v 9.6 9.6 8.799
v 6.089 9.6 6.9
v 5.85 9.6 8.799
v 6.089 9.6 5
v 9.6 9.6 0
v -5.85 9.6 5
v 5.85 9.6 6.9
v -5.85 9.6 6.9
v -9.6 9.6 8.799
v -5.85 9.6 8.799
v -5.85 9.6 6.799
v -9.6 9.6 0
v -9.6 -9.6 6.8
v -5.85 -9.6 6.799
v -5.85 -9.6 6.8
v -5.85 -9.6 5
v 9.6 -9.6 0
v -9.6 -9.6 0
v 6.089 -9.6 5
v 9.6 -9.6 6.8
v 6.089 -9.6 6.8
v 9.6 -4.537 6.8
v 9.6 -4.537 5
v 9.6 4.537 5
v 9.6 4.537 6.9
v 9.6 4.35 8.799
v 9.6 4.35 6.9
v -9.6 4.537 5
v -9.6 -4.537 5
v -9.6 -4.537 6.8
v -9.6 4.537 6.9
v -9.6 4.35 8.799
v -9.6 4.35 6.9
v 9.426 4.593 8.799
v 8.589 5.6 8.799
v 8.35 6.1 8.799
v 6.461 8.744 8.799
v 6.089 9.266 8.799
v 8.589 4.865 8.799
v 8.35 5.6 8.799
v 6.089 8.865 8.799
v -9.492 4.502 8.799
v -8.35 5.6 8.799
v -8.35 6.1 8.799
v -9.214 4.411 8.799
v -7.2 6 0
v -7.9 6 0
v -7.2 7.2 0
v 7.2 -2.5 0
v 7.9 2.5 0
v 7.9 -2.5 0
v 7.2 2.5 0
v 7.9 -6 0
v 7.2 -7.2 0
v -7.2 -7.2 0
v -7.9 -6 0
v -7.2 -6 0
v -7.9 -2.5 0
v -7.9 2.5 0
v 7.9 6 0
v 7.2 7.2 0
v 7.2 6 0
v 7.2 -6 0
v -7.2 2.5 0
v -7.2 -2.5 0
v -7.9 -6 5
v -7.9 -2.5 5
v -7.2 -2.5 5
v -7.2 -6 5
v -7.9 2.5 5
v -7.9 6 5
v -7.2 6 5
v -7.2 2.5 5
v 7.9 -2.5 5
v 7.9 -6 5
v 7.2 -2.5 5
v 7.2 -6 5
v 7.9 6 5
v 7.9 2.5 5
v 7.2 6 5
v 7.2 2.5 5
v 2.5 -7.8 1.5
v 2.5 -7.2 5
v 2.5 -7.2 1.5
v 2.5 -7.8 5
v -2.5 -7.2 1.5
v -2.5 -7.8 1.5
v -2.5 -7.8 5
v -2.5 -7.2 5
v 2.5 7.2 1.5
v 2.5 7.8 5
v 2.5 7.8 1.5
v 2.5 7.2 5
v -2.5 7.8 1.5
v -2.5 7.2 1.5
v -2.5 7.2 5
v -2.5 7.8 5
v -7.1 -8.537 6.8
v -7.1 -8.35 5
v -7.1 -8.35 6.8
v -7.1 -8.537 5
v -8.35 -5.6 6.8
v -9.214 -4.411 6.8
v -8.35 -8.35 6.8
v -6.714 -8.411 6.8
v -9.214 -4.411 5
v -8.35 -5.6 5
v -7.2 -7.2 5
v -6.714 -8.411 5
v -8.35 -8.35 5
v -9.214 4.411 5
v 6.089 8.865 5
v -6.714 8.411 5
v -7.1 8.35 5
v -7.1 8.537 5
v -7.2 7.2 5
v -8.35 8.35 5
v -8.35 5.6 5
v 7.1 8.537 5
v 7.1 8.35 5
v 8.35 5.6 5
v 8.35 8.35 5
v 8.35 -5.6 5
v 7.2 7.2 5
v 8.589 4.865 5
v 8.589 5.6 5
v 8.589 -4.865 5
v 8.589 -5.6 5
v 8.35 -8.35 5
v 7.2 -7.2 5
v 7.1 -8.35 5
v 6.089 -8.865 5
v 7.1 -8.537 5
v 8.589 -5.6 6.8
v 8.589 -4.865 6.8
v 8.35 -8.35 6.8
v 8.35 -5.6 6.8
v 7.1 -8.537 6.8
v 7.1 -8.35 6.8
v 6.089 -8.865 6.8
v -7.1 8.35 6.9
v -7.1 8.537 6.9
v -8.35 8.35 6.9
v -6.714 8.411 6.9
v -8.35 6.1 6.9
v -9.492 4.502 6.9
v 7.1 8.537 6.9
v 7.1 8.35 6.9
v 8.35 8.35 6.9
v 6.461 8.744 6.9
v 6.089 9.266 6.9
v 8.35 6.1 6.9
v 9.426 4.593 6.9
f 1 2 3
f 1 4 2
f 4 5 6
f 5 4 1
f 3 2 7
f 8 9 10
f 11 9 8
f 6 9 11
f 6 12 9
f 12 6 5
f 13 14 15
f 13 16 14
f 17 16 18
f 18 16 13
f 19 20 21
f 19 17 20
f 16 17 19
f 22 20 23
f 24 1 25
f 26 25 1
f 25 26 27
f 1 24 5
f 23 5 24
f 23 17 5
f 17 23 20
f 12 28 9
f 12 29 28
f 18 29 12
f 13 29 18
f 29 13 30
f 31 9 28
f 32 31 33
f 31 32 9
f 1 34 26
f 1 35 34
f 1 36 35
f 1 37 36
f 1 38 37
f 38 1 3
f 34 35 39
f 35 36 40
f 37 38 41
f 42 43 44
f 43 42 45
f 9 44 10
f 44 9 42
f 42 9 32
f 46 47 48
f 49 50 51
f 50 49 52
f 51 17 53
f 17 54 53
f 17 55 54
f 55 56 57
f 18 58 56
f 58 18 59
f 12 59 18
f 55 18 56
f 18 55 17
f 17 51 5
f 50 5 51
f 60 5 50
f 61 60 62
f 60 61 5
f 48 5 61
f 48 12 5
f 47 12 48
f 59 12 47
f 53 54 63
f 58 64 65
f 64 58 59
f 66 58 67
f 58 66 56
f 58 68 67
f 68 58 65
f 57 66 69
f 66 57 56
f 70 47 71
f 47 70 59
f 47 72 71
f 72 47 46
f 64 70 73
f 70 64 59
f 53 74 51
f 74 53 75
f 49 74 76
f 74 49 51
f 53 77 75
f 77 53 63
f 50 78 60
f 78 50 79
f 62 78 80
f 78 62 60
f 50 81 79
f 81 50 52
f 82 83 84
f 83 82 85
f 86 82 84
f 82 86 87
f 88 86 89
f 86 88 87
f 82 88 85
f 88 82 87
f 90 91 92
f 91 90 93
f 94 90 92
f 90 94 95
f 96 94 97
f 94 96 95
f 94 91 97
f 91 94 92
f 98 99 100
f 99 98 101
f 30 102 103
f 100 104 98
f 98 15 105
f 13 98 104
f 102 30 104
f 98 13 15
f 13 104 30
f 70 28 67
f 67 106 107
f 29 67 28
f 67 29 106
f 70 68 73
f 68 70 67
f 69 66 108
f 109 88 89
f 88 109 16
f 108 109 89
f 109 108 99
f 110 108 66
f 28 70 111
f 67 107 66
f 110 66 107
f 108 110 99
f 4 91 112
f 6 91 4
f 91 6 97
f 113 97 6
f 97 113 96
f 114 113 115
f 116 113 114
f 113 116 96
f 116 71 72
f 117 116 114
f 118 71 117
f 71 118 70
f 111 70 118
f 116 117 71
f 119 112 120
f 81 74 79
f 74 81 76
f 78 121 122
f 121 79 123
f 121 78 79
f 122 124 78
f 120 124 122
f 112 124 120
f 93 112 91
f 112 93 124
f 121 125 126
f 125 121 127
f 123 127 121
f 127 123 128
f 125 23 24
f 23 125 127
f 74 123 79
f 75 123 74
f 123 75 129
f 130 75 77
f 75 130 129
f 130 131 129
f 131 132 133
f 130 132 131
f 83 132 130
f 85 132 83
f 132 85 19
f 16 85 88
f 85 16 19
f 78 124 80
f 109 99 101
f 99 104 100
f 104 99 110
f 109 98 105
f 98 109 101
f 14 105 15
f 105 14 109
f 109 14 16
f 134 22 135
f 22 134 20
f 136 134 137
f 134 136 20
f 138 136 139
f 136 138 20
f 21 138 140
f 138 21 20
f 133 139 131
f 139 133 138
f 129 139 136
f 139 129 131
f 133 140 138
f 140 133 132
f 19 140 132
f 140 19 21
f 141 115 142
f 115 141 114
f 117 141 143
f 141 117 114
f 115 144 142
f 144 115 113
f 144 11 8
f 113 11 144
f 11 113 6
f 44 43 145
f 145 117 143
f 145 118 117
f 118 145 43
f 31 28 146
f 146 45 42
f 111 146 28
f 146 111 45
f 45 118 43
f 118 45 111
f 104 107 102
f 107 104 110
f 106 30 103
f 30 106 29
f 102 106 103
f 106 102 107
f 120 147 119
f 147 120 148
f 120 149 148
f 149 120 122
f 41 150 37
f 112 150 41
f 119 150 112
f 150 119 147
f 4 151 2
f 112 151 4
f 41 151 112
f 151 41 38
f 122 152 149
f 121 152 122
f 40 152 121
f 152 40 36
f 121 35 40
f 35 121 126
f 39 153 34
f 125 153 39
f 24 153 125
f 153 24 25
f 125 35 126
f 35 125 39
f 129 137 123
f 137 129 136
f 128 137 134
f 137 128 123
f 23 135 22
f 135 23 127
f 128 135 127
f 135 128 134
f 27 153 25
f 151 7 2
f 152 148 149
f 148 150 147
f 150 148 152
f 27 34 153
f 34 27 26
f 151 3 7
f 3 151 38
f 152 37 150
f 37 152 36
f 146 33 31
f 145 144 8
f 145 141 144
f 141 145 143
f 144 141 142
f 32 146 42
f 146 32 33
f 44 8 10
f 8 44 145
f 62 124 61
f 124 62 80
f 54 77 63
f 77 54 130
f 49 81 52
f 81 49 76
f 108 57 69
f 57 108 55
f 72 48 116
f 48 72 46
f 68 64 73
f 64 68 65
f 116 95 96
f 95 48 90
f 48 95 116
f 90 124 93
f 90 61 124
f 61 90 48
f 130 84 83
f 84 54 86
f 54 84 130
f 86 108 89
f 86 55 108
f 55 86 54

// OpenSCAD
group() {
	difference() {
		group() {
			multmatrix([[1, 0, 0, 0], [0, 1, 0, 0], [0, 0, 1, 4.4], [0, 0, 0, 1]]) {
				cube(size = [19.2, 19.2, 8.8], center = true);
			}
		}
		group() {
			group() {
				polyhedron(points = [[9.6, 9.6, 0], [-9.6, 9.6, 0], [-9.6, -9.6, 0], [9.6, -9.6, 0], [9.6, 9.6, -0], [-9.6, 9.6, -0], [-9.6, -9.6, -0], [9.6, -9.6, -0]], faces = [[0, 1, 2, 3], [4, 7, 6, 5], [0, 3, 7, 4], [0, 4, 5, 1], [1, 5, 6, 2], [2, 6, 7, 3]], convexity = 1);
			}
			multmatrix([[1, 0, 0, 0], [0, 1, 0, 0], [0, 0, 1, 8.7995], [0, 0, 0, 1]]) {
				union() {
					cube(size = [19.2, 19.2, 0.001], center = true);
					multmatrix([[1, 0, 0, 0], [0, 1, 0, 0], [0, 0, 1, -1], [0, 0, 0, 1]]) {
						union() {
							cube(size = [11.7, 19.2, 2.001], center = true);
							cube(size = [19.2, 8.7, 2.001], center = true);
						}
					}
				}
			}
			multmatrix([[1, 0, 0, 0], [0, 1, 0, 0], [0, 0, 1, 3.4], [0, 0, 0, 1]]) {
				cube(size = [14.4, 14.4, 6.8], center = true);
			}
			group() {
				group() {
					group() {
						multmatrix([[1, 0, 0, -7.5], [0, 1, 0, -4.25], [0, 0, 1, 3.4], [0, 0, 0, 1]]) {
							cube(size = [0.8, 3.5, 6.8], center = true);
						}
						multmatrix([[1, 0, 0, -7.5], [0, 1, 0, 4.25], [0, 0, 1, 3.4], [0, 0, 0, 1]]) {
							cube(size = [0.8, 3.5, 6.8], center = true);
						}
					}
					group() {
						multmatrix([[1, 0, 0, 7.5], [0, 1, 0, -4.25], [0, 0, 1, 3.4], [0, 0, 0, 1]]) {
							cube(size = [0.8, 3.5, 6.8], center = true);
						}
						multmatrix([[1, 0, 0, 7.5], [0, 1, 0, 4.25], [0, 0, 1, 3.4], [0, 0, 0, 1]]) {
							cube(size = [0.8, 3.5, 6.8], center = true);
						}
					}
				}
			}
			group() {
				multmatrix([[1, 0, 0, 0], [0, 1, 0, -7.1], [0, 0, 1, 4.15], [0, 0, 0, 1]]) {
					cube(size = [5, 1.4, 5.3], center = true);
				}
				multmatrix([[1, 0, 0, 0], [0, 1, 0, 7.1], [0, 0, 1, 4.15], [0, 0, 0, 1]]) {
					cube(size = [5, 1.4, 5.3], center = true);
				}
			}
			multmatrix([[1, 0, 0, 0], [0, 1, 0, 0], [0, 0, 1, 6.9], [0, 0, 0, 1]]) {
				difference() {
					cube(size = [19.2, 19.2, 3.8], center = true);
					union() {
						group() {
							multmatrix([[1, 0, 0, -8.35], [0, 1, 0, 8.975], [0, 0, 1, 0], [0, 0, 0, 1]]) {
								cube(size = [2.5, 1.25, 3.8], center = true);
							}
							multmatrix([[1, 0, 0, -7.1], [0, 1, 0, 9.6], [0, 0, 1, -1.9], [0, 0, 0, 1]]) {
								cylinder($fn = 0, $fa = 12, $fs = 2, h = 3.8, r1 = 1.25, r2 = 1.25, center = false);
							}
							group() {
								multmatrix([[1, 0, 0, -8.35], [0, 1, 0, -8.975], [0, 0, 1, -1], [0, 0, 0, 1]]) {
									cube(size = [2.5, 1.25, 1.8], center = true);
								}
								multmatrix([[1, 0, 0, -7.1], [0, 1, 0, -9.6], [0, 0, 1, -1.9], [0, 0, 0, 1]]) {
									cylinder($fn = 0, $fa = 12, $fs = 2, h = 1.8, r1 = 1.25, r2 = 1.25, center = false);
								}
							}
							multmatrix([[1, 0, 0, -8.975], [0, 1, 0, 7.6], [0, 0, 1, 0], [0, 0, 0, 1]]) {
								cube(size = [1.25, 4, 3.8], center = true);
							}
							multmatrix([[1, 0, 0, -9.6], [0, 1, 0, 5.6], [0, 0, 1, -1.9], [0, 0, 0, 1]]) {
								cylinder($fn = 0, $fa = 12, $fs = 2, h = 3.8, r1 = 1.25, r2 = 1.25, center = false);
							}
							multmatrix([[1, 0, 0, -8.975], [0, 1, 0, -7.6], [0, 0, 1, -1], [0, 0, 0, 1]]) {
								cube(size = [1.25, 4, 1.8], center = true);
							}
							multmatrix([[1, 0, 0, -9.6], [0, 1, 0, -5.6], [0, 0, 1, -1.9], [0, 0, 0, 1]]) {
								cylinder($fn = 0, $fa = 12, $fs = 2, h = 1.8, r1 = 1.25, r2 = 1.25, center = false);
							}
							multmatrix([[1, 0, 0, 8.35], [0, 1, 0, 8.975], [0, 0, 1, 0], [0, 0, 0, 1]]) {
								cube(size = [2.5, 1.25, 3.8], center = true);
							}
							multmatrix([[1, 0, 0, 7.1], [0, 1, 0, 9.6], [0, 0, 1, -1.9], [0, 0, 0, 1]]) {
								cylinder($fn = 0, $fa = 12, $fs = 2, h = 3.8, r1 = 1.25, r2 = 1.25, center = false);
							}
							group() {
								multmatrix([[1, 0, 0, 8.35], [0, 1, 0, -8.975], [0, 0, 1, -1], [0, 0, 0, 1]]) {
									cube(size = [2.5, 1.25, 1.8], center = true);
								}
								multmatrix([[1, 0, 0, 7.1], [0, 1, 0, -9.6], [0, 0, 1, -1.9], [0, 0, 0, 1]]) {
									cylinder($fn = 0, $fa = 12, $fs = 2, h = 1.8, r1 = 1.25, r2 = 1.25, center = false);
								}
							}
							multmatrix([[1, 0, 0, 8.975], [0, 1, 0, 7.6], [0, 0, 1, 0], [0, 0, 0, 1]]) {
								cube(size = [1.25, 4, 3.8], center = true);
							}
							multmatrix([[1, 0, 0, 9.6], [0, 1, 0, 5.6], [0, 0, 1, -1.9], [0, 0, 0, 1]]) {
								cylinder($fn = 0, $fa = 12, $fs = 2, h = 3.8, r1 = 1.25, r2 = 1.25, center = false);
							}
							multmatrix([[1, 0, 0, 8.975], [0, 1, 0, -7.6], [0, 0, 1, -1], [0, 0, 0, 1]]) {
								cube(size = [1.25, 4, 1.8], center = true);
							}
							multmatrix([[1, 0, 0, 9.6], [0, 1, 0, -5.6], [0, 0, 1, -1.9], [0, 0, 0, 1]]) {
								cylinder($fn = 0, $fa = 12, $fs = 2, h = 1.8, r1 = 1.25, r2 = 1.25, center = false);
							}
						}
						group() {
							multmatrix([[1, 0, 0, 9.6], [0, 1, 0, 9.6], [0, 0, 1, 0], [0, 0, 0, 1]]) {
								multmatrix([[-1, 0, 0, 0], [-0, -1, 0, 0], [-0, 0, 1, 0], [0, 0, 0, 1]]) {
									group() {
										polyhedron(points = [[0, 0, 0], [3.75, 0, 0], [0, 5.25, 0], [0, 0, 2], [3.75, 0, 2], [0, 5.25, 2]], faces = [[0, 1, 2], [0, 3, 4, 1], [0, 2, 5, 3], [1, 4, 5, 2], [3, 5, 4]], convexity = 1);
									}
								}
							}
							multmatrix([[1, 0, 0, -9.6], [0, 1, 0, 9.6], [0, 0, 1, 2], [0, 0, 0, 1]]) {
								multmatrix([[1, 0, 0, 0], [0, -1, 0, 0], [0, 0, -1, 0], [0, 0, 0, 1]]) {
									group() {
										polyhedron(points = [[0, 0, 0], [3.75, 0, 0], [0, 5.25, 0], [0, 0, 2], [3.75, 0, 2], [0, 5.25, 2]], faces = [[0, 1, 2], [0, 3, 4, 1], [0, 2, 5, 3], [1, 4, 5, 2], [3, 5, 4]], convexity = 1);
									}
								}
							}
						}
					}
				}
			}
		}
	}
}
